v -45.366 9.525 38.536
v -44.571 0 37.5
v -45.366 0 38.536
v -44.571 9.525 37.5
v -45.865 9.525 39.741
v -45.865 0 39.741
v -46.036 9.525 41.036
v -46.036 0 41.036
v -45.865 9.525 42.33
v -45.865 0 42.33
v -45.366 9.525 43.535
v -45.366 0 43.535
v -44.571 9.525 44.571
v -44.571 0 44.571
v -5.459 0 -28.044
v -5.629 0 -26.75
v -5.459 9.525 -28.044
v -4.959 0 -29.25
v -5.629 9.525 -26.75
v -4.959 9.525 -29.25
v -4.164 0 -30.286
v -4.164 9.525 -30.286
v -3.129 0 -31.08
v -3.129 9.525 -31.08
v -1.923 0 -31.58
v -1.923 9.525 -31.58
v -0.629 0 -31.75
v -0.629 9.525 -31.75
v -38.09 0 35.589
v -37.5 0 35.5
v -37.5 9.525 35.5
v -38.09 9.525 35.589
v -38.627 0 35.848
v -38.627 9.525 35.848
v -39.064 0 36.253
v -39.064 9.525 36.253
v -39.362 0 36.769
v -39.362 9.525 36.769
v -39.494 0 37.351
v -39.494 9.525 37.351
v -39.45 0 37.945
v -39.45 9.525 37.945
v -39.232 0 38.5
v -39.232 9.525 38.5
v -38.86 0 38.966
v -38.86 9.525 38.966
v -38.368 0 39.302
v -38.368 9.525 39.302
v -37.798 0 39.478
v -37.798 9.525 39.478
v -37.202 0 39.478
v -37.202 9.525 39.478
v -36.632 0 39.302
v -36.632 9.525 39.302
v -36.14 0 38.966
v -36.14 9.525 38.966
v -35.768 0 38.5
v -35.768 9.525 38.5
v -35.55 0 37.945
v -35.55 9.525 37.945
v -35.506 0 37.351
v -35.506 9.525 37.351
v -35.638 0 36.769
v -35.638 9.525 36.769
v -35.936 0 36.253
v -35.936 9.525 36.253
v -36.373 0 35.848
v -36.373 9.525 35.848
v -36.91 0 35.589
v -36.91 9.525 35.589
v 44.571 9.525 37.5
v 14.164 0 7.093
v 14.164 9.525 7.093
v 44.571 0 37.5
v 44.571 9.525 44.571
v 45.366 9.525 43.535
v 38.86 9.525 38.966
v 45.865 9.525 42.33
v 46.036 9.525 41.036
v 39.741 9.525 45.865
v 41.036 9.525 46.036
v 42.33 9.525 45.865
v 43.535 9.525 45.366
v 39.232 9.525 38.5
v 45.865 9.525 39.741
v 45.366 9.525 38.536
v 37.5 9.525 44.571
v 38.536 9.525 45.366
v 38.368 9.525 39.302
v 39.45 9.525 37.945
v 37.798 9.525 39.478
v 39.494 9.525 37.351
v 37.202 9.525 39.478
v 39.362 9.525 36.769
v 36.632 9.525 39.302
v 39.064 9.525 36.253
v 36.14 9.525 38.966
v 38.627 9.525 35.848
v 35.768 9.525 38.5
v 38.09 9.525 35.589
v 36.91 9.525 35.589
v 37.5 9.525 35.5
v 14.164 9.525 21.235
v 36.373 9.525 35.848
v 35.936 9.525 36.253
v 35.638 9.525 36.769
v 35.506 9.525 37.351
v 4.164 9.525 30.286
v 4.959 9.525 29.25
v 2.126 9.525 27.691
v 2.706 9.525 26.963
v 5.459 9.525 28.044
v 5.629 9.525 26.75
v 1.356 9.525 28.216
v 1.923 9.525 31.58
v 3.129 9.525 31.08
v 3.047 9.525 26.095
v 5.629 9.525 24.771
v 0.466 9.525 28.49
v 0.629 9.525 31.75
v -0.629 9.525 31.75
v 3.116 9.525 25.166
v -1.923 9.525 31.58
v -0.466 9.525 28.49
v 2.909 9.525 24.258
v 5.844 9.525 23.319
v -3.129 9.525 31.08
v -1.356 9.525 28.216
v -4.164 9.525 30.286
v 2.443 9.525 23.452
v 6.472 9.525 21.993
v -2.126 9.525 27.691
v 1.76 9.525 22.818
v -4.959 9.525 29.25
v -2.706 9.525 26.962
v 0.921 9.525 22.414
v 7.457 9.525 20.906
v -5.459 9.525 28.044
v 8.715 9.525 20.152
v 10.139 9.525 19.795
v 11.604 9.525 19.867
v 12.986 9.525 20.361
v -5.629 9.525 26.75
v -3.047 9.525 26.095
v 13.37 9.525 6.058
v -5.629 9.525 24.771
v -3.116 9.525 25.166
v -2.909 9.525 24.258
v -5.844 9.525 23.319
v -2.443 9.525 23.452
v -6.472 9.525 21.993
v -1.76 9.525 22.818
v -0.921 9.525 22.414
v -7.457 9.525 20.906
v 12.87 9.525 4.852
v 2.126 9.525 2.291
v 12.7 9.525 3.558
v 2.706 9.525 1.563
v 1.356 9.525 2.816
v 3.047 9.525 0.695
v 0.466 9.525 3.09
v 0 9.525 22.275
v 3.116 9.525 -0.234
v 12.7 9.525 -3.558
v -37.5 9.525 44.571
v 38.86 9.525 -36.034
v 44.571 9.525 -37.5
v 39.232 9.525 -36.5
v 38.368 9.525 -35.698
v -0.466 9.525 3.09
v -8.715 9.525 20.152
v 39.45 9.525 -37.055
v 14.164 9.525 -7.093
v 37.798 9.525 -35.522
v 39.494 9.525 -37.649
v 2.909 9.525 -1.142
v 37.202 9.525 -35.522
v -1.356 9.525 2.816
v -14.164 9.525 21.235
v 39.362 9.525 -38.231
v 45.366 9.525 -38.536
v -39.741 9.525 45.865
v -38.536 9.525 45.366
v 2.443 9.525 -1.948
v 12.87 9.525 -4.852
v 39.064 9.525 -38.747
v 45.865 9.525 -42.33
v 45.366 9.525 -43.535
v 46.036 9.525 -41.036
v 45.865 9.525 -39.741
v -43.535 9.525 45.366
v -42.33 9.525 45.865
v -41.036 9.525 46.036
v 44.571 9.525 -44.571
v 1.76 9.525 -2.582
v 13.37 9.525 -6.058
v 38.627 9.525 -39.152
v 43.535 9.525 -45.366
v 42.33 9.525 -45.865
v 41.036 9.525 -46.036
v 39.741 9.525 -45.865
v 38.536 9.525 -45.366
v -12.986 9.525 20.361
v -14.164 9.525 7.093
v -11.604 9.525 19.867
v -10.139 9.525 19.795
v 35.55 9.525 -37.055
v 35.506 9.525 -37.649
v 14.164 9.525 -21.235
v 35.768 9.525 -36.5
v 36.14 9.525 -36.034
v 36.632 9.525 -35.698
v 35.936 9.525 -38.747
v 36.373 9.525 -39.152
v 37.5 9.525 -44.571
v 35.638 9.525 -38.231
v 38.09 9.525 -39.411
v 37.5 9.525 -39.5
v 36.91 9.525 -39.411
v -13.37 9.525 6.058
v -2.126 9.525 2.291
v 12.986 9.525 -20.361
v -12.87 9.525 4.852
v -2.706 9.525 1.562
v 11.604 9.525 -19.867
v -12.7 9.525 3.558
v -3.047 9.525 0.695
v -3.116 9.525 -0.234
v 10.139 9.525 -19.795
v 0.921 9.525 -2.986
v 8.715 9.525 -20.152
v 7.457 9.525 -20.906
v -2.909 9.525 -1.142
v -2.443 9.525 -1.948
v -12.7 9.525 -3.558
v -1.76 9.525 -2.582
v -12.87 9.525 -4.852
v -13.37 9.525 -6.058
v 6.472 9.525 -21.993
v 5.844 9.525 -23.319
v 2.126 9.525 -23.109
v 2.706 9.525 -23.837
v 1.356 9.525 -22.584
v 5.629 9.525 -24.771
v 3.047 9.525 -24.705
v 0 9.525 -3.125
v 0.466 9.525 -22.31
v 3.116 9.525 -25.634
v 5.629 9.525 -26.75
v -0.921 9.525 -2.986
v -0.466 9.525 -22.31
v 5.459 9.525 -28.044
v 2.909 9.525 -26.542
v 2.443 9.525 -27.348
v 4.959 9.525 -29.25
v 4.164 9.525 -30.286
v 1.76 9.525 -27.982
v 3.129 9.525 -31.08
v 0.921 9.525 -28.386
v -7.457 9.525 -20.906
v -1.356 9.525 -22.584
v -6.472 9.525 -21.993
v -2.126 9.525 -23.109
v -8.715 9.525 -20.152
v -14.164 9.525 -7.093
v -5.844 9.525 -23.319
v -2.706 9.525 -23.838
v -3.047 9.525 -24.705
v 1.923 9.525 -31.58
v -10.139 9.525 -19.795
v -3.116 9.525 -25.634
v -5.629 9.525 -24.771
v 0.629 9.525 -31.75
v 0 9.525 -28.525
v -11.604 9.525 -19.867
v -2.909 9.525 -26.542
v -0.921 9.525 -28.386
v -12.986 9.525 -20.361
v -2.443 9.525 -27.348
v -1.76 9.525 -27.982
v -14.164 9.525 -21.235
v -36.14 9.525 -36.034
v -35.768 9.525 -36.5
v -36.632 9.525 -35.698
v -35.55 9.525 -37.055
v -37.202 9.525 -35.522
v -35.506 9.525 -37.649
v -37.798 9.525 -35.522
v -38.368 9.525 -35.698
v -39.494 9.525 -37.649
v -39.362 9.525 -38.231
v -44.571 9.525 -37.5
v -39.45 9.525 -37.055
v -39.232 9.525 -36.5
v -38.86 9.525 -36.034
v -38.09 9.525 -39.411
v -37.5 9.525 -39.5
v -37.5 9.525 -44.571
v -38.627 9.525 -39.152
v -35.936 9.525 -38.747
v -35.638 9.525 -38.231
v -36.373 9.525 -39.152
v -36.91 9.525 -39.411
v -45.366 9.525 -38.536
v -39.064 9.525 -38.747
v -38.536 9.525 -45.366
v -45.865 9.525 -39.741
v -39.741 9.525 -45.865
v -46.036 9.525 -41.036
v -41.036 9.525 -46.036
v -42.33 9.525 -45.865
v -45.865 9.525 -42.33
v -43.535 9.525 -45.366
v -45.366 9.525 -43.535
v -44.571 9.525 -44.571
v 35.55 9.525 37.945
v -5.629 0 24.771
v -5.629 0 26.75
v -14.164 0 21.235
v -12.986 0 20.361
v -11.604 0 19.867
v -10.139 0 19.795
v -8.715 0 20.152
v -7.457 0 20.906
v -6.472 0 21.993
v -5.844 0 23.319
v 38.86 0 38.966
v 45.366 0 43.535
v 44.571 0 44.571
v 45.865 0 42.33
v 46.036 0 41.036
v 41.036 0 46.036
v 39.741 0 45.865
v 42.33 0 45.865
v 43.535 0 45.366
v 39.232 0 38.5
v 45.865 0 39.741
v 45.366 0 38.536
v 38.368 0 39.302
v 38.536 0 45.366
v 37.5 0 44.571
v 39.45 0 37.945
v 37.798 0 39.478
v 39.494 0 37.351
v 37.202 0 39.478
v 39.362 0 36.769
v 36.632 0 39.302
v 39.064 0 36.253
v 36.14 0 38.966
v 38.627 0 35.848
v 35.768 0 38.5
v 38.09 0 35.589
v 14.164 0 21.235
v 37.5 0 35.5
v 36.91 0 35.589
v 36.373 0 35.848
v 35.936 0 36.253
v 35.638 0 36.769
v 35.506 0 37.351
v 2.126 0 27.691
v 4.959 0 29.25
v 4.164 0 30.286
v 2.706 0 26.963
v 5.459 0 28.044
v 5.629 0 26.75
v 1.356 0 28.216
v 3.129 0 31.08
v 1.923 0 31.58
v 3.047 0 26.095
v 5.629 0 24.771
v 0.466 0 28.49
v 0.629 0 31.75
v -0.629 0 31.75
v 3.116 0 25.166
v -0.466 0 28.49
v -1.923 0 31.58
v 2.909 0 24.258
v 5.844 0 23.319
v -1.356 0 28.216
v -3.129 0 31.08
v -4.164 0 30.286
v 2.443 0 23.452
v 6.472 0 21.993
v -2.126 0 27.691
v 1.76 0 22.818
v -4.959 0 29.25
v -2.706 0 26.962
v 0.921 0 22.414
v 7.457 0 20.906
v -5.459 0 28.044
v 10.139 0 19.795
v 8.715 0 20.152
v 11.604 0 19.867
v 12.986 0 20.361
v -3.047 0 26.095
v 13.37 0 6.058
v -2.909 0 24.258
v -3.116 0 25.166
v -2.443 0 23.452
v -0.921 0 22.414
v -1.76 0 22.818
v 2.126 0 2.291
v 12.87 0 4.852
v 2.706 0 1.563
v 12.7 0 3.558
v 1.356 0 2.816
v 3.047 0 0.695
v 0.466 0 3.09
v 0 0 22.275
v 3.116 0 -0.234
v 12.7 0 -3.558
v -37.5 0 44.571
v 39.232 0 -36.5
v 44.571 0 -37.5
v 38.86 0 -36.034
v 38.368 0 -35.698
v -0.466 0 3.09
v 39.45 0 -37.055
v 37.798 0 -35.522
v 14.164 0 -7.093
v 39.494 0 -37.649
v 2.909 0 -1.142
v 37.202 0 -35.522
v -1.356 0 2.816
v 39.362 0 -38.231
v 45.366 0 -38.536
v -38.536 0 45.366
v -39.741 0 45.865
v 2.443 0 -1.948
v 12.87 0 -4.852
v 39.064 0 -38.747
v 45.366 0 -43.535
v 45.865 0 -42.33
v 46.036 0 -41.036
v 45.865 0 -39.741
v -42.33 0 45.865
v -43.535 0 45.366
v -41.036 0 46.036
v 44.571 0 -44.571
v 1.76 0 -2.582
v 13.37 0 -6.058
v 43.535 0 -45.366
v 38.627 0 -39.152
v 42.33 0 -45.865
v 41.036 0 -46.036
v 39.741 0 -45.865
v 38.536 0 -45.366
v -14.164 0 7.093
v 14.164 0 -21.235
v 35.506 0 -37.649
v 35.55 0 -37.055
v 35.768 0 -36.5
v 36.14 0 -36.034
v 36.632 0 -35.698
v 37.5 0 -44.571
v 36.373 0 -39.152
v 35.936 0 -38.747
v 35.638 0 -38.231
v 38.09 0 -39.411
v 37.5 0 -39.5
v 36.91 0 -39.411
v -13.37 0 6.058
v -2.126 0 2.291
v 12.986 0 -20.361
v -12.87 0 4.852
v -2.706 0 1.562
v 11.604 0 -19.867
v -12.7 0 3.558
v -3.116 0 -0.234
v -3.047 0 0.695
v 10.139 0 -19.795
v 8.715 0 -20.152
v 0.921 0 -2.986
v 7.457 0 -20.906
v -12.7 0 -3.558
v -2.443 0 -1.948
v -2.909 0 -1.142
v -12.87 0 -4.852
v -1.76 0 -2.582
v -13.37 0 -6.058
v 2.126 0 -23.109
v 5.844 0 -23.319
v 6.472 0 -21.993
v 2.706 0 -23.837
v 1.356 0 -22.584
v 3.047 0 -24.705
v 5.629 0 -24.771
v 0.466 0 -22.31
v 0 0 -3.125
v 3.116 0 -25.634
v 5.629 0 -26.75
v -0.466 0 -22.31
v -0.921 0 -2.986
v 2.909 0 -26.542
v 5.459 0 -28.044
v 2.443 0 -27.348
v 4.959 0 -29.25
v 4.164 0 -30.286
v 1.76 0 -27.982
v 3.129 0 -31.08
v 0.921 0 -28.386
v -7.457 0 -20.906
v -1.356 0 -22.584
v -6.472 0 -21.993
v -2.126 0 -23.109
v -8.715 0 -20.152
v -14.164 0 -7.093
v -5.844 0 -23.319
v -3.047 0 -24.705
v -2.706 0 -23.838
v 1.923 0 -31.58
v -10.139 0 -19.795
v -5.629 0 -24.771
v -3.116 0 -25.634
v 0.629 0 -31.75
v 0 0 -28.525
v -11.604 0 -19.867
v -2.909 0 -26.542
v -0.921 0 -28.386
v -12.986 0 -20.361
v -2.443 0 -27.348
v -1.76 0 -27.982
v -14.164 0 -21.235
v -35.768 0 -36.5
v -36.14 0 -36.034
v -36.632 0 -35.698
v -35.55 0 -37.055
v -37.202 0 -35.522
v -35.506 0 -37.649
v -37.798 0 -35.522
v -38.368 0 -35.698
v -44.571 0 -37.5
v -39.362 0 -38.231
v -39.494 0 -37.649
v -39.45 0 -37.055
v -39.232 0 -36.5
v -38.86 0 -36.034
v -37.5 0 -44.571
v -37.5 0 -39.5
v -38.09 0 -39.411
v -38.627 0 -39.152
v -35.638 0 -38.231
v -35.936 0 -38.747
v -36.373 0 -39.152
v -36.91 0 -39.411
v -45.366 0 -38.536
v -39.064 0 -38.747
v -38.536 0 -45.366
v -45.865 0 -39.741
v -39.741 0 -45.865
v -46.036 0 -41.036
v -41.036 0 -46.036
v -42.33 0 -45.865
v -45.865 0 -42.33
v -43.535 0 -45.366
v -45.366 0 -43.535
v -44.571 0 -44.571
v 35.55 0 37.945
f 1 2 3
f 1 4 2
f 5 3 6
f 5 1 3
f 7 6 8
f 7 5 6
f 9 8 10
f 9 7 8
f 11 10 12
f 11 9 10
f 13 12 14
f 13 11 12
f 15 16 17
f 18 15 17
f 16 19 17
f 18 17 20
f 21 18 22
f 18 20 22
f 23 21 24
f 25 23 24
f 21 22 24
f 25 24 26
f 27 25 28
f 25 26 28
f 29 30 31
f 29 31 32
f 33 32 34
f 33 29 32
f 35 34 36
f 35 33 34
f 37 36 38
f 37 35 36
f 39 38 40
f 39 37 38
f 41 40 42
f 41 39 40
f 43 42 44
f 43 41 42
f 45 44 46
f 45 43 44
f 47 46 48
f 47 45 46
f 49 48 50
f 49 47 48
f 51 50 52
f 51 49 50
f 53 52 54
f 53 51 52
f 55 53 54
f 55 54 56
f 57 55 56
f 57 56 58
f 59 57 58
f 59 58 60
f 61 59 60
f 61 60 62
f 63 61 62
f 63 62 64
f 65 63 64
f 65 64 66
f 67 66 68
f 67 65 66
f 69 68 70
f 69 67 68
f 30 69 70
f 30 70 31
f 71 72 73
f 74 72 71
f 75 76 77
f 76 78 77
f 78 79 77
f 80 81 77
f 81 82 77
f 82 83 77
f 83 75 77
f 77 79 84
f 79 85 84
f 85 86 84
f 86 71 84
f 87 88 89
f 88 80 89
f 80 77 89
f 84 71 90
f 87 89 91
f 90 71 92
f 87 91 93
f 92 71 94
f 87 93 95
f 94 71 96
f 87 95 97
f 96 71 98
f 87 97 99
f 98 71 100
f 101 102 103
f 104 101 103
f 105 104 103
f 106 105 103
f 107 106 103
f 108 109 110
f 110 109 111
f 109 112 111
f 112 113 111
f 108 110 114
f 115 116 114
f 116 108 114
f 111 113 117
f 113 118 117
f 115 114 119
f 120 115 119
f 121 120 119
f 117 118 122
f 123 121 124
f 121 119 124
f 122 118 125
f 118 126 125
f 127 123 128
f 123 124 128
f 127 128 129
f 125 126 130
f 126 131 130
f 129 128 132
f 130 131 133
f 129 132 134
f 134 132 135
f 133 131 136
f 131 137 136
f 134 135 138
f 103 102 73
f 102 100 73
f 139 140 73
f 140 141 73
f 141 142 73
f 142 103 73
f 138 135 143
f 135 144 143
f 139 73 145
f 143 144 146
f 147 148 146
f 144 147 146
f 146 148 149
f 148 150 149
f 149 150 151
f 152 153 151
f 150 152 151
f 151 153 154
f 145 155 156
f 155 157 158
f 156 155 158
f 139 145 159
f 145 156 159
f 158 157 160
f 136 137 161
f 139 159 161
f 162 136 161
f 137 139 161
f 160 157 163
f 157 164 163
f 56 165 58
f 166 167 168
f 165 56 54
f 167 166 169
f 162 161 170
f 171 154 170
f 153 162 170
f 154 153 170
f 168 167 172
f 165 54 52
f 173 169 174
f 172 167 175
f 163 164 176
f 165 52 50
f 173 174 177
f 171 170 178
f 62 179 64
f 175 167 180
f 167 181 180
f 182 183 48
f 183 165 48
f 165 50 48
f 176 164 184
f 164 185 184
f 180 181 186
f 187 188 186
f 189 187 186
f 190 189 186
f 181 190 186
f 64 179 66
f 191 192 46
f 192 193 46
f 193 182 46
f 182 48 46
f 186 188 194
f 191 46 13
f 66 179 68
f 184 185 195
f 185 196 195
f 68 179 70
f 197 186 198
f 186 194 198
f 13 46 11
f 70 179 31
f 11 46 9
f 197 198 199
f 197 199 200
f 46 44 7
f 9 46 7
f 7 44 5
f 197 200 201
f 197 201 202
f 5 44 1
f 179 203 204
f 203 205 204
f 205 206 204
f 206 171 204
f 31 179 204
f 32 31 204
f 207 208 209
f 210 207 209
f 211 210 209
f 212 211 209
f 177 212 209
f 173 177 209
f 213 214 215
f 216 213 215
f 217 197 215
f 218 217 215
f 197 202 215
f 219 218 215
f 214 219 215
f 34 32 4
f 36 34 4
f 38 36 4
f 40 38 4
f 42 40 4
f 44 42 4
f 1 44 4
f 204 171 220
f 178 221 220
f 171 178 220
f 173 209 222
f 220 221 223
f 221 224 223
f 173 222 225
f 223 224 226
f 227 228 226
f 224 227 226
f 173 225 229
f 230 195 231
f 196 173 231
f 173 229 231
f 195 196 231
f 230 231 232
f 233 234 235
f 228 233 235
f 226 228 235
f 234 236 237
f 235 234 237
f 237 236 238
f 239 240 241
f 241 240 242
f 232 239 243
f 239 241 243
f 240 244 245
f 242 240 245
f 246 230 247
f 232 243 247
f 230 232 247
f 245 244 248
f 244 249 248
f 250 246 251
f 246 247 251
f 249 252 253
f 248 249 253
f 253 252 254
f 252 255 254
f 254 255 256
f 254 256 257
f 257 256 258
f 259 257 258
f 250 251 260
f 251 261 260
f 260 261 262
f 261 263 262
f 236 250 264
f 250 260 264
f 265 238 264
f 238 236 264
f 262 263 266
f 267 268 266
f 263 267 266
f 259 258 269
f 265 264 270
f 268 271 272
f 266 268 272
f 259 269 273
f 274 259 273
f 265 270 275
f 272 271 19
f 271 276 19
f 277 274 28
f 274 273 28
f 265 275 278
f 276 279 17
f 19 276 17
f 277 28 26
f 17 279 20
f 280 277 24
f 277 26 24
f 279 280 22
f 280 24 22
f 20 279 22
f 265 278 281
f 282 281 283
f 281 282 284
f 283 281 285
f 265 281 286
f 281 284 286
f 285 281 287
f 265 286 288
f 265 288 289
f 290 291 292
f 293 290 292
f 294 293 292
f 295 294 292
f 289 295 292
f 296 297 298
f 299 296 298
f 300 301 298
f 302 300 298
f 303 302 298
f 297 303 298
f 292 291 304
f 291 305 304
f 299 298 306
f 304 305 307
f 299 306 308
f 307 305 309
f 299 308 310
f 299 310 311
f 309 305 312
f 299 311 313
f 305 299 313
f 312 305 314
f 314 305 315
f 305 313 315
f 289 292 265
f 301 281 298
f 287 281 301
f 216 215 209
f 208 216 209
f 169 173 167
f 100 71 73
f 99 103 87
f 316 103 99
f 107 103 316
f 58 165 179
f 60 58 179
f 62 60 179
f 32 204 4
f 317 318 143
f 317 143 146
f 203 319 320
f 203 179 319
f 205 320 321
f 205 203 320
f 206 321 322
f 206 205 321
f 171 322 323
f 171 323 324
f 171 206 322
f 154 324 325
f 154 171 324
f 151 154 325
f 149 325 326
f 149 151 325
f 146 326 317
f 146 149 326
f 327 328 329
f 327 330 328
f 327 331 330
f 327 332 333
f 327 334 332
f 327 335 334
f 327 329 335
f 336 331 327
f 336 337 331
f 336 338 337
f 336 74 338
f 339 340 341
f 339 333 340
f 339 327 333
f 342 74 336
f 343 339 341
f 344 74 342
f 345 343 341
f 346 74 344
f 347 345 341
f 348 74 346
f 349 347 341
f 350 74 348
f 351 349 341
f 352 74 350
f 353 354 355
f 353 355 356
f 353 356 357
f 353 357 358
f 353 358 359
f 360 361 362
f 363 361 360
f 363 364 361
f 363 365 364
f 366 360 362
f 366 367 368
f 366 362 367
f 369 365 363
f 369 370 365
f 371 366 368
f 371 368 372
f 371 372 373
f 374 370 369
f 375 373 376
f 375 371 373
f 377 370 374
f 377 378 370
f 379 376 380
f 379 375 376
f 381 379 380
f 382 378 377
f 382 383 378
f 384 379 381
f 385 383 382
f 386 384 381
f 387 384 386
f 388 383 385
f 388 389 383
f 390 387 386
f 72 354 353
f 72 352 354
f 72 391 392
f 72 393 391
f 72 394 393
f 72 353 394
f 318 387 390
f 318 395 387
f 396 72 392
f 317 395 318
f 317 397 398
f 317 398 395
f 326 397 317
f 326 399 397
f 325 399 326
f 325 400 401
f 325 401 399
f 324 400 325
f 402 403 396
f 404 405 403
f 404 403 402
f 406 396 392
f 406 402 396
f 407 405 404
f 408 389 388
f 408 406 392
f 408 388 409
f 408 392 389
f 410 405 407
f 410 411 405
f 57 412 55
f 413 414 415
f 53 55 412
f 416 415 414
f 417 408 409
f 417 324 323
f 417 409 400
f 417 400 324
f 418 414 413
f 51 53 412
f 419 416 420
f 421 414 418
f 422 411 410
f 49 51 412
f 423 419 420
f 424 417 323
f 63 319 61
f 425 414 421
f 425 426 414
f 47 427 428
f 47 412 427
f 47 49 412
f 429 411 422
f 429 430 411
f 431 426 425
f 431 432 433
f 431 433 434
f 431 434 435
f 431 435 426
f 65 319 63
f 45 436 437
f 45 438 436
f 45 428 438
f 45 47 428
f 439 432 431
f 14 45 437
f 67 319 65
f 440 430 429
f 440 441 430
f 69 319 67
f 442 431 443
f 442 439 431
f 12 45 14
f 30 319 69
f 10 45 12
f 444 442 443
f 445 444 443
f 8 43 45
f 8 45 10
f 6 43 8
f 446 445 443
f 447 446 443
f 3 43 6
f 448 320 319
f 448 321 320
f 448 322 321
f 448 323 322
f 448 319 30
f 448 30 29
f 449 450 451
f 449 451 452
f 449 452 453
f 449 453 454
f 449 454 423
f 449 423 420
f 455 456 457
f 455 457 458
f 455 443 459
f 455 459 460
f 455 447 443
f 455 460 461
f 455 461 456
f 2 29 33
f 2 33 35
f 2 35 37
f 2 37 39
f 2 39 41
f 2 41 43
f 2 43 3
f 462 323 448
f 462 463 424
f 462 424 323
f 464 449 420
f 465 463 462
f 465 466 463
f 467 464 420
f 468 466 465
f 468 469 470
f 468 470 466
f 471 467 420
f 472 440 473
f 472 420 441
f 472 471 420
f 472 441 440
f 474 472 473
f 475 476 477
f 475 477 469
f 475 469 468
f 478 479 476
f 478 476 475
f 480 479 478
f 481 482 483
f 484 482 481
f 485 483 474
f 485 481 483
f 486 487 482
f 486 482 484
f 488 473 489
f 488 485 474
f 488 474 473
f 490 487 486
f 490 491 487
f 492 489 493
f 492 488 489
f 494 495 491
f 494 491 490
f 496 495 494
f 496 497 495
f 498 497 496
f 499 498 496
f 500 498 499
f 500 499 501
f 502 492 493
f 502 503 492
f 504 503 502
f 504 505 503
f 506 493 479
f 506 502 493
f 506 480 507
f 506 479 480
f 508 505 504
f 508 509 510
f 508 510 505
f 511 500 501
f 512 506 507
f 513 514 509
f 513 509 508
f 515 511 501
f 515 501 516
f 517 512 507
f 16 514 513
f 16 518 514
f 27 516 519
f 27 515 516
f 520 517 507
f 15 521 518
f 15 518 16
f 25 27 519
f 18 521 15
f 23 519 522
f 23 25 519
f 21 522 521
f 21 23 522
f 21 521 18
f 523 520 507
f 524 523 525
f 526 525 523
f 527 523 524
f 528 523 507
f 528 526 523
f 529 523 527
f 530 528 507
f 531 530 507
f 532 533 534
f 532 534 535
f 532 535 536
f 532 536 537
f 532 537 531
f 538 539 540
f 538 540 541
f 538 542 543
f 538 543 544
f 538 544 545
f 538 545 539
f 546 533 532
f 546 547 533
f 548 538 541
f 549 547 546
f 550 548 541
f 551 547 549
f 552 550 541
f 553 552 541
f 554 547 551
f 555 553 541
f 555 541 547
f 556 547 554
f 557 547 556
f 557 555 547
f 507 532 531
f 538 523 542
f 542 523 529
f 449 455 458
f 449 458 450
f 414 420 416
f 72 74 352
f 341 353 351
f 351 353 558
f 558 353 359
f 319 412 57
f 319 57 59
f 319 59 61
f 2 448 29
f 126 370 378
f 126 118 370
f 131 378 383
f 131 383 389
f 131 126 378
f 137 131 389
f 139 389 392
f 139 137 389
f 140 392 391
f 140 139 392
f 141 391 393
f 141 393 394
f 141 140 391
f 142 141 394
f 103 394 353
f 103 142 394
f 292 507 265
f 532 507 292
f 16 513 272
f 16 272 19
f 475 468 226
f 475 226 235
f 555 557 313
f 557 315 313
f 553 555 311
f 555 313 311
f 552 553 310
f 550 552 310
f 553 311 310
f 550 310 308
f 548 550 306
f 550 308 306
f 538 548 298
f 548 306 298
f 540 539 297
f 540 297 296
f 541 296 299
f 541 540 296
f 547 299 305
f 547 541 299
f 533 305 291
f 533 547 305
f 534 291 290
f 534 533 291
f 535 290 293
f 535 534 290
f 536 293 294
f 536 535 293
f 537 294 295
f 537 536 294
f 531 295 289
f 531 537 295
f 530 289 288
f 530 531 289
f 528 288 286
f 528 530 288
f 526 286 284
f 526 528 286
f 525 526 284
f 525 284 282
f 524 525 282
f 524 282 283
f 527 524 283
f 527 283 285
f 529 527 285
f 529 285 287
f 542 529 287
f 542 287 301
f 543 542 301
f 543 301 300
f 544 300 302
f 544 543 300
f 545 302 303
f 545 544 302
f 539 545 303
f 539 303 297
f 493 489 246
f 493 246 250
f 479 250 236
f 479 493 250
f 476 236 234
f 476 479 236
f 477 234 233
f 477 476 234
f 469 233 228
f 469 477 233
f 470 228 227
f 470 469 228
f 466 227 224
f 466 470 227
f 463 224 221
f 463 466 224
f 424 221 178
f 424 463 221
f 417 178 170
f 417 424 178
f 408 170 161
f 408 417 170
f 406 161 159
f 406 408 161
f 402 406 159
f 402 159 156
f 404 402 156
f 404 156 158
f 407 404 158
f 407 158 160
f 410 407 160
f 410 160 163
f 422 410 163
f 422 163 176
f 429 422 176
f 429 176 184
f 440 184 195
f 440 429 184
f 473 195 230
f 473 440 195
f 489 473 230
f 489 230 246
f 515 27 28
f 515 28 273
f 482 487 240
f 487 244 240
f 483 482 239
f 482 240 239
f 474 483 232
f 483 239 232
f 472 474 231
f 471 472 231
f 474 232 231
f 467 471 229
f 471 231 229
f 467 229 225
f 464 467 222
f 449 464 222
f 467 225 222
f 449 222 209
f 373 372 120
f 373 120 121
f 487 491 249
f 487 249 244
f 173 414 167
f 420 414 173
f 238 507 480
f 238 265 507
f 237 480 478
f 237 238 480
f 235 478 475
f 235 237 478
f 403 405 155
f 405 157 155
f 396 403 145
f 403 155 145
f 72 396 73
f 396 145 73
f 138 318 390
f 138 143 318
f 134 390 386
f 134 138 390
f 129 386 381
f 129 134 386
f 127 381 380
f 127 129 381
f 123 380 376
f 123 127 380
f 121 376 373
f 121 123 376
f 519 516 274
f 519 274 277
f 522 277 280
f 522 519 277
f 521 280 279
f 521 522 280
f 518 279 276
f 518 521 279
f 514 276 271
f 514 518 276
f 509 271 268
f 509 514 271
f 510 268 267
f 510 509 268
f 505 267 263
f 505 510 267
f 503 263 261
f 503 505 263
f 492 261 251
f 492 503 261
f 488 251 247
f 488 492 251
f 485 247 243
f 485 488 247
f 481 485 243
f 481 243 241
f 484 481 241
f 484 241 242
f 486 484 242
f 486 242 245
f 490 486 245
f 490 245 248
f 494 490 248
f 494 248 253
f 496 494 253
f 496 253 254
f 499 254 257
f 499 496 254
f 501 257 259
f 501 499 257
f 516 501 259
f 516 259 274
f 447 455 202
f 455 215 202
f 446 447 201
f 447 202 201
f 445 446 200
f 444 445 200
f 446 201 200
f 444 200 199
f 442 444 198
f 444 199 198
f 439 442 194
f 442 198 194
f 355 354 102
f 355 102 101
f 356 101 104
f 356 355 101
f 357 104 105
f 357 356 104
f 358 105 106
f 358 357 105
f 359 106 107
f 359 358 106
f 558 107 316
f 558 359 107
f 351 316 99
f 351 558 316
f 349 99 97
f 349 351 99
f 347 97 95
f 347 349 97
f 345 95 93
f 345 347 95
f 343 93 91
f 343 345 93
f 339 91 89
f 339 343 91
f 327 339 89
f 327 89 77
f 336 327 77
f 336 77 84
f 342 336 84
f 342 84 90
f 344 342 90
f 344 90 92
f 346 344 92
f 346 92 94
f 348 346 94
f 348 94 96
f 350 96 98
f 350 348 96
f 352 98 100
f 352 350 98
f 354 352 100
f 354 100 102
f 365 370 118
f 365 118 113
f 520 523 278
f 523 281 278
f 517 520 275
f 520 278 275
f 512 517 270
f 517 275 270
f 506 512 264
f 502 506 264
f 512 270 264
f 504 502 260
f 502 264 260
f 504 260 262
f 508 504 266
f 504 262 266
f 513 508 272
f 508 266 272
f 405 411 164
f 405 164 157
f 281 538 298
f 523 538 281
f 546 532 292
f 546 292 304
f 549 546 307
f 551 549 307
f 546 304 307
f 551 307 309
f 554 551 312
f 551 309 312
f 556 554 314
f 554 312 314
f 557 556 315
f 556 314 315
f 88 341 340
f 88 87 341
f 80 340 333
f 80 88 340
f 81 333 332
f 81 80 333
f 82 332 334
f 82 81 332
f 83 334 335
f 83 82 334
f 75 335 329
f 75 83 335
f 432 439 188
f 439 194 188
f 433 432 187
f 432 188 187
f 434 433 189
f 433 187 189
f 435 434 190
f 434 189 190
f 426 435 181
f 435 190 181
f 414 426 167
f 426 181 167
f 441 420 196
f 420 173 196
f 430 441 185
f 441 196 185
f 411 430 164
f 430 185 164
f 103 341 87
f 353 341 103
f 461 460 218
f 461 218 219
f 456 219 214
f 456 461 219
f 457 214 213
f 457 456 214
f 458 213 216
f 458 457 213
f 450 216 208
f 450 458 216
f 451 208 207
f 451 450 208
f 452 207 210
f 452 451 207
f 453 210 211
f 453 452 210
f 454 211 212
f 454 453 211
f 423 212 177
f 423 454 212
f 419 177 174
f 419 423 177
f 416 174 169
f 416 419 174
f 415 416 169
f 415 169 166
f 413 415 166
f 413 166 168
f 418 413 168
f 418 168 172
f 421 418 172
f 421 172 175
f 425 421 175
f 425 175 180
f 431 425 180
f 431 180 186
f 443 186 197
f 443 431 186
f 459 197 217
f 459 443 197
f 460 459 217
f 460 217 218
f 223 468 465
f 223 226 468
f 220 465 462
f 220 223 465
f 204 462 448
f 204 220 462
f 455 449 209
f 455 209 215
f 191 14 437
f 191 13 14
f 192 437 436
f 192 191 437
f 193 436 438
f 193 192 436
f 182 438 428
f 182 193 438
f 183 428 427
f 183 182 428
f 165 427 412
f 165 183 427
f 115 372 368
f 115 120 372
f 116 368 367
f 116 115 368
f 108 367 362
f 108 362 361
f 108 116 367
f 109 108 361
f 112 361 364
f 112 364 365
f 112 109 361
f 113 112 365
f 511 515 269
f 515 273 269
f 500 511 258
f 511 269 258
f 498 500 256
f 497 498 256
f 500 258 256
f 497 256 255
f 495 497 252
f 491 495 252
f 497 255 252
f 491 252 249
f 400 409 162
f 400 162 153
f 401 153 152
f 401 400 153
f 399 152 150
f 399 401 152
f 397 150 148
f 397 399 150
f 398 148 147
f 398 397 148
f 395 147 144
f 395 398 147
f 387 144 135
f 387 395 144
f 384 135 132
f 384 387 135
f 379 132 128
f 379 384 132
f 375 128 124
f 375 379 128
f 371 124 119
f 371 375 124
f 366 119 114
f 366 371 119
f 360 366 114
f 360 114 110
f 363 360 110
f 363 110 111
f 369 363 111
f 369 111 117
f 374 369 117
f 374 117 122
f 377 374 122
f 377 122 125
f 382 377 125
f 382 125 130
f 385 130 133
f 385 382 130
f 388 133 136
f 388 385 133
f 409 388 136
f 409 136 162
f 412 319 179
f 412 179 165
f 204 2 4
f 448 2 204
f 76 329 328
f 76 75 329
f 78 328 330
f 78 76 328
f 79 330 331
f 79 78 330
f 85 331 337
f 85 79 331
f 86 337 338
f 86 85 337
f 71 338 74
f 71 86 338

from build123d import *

# Parameters (mm, degrees)
SKETCH1_R           = 2
SKETCH1_R_2         = 3.125
BOSS_EXTRUDE1_DEPTH = 9.525
FILLET1_R           = 5


with BuildPart() as part:
    # Sketch1 → Boss-Extrude1 (new body)
    with BuildSketch(Plane(origin=(0, 0, 0), x_dir=(1, 0, 0), z_dir=(0, 1, 0))):
        Polygon((-12.7, 5.628932188), (-48.106601718, 41.035533906), (-41.035533906, 48.106601718), (-5.628932188, 12.7), (-5.628932188, 31.75), (5.628932188, 31.75), (5.628932188, 12.7), (41.035533906, 48.106601718), (48.106601718, 41.035533906), (12.7, 5.628932188), (12.7, -5.628932188), (48.106601718, -41.035533906), (41.035533906, -48.106601718), (5.628932188, -12.7), (5.628932188, -31.75), (-5.628932188, -31.75), (-5.628932188, -12.7), (-41.035533906, -48.106601718), (-48.106601718, -41.035533906), (-12.7, -5.628932188), align=None)
        with Locations(Location((37.5, 37.5, 0), (0, 0, 90))):
            Circle(SKETCH1_R, mode=Mode.SUBTRACT)
        with Locations(Location((37.5, -37.5, 0), (0, 0, 90))):
            Circle(SKETCH1_R, mode=Mode.SUBTRACT)
        with Locations(Location((-37.5, -37.5, 0), (0, 0, 90))):
            Circle(SKETCH1_R, mode=Mode.SUBTRACT)
        with Locations(Location((-37.5, 37.5, 0), (0, 0, 90))):
            Circle(SKETCH1_R, mode=Mode.SUBTRACT)
        with Locations(Location((0, 0, 0), (0, 0, 90))):
            Circle(SKETCH1_R_2, mode=Mode.SUBTRACT)
        with Locations(Location((0, 25.4, 0), (0, 0, 90))):
            Circle(SKETCH1_R_2, mode=Mode.SUBTRACT)
        with Locations(Location((0, -25.4, 0), (0, 0, 90))):
            Circle(SKETCH1_R_2, mode=Mode.SUBTRACT)
    extrude(amount=BOSS_EXTRUDE1_DEPTH)

    # Fillet1
    fillet1_edges = [part.edges().sort_by_distance(p)[0] for p in [
        (12.7, 4.7625, -5.628932188),
        (12.7, 4.7625, 5.628932188),
        (48.106601718, 4.7625, 41.035533906),
        (41.035533906, 4.7625, 48.106601718),
        (-41.035533906, 4.7625, 48.106601718),
        (-48.106601718, 4.7625, 41.035533906),
        (-12.7, 4.7625, 5.628932188),
        (-48.106601718, 4.7625, -41.035533906),
        (-41.035533906, 4.7625, -48.106601718),
        (41.035533906, 4.7625, -48.106601718),
        (48.106601718, 4.7625, -41.035533906),
        (-12.7, 4.7625, -5.628932188),
        (-5.628932188, 4.7625, 31.75),
        (-5.628932188, 4.7625, 12.7),
        (5.628932188, 4.7625, 12.7),
        (5.628932188, 4.7625, -12.7),
        (5.628932188, 4.7625, -31.75),
        (-5.628932188, 4.7625, -31.75),
        (-5.628932188, 4.7625, -12.7),
        (5.628932188, 4.7625, 31.75),
    ]]
    fillet(fillet1_edges, radius=FILLET1_R - 0.0001)  # a hair under: the kernel refuses the full size


solid = part.part
